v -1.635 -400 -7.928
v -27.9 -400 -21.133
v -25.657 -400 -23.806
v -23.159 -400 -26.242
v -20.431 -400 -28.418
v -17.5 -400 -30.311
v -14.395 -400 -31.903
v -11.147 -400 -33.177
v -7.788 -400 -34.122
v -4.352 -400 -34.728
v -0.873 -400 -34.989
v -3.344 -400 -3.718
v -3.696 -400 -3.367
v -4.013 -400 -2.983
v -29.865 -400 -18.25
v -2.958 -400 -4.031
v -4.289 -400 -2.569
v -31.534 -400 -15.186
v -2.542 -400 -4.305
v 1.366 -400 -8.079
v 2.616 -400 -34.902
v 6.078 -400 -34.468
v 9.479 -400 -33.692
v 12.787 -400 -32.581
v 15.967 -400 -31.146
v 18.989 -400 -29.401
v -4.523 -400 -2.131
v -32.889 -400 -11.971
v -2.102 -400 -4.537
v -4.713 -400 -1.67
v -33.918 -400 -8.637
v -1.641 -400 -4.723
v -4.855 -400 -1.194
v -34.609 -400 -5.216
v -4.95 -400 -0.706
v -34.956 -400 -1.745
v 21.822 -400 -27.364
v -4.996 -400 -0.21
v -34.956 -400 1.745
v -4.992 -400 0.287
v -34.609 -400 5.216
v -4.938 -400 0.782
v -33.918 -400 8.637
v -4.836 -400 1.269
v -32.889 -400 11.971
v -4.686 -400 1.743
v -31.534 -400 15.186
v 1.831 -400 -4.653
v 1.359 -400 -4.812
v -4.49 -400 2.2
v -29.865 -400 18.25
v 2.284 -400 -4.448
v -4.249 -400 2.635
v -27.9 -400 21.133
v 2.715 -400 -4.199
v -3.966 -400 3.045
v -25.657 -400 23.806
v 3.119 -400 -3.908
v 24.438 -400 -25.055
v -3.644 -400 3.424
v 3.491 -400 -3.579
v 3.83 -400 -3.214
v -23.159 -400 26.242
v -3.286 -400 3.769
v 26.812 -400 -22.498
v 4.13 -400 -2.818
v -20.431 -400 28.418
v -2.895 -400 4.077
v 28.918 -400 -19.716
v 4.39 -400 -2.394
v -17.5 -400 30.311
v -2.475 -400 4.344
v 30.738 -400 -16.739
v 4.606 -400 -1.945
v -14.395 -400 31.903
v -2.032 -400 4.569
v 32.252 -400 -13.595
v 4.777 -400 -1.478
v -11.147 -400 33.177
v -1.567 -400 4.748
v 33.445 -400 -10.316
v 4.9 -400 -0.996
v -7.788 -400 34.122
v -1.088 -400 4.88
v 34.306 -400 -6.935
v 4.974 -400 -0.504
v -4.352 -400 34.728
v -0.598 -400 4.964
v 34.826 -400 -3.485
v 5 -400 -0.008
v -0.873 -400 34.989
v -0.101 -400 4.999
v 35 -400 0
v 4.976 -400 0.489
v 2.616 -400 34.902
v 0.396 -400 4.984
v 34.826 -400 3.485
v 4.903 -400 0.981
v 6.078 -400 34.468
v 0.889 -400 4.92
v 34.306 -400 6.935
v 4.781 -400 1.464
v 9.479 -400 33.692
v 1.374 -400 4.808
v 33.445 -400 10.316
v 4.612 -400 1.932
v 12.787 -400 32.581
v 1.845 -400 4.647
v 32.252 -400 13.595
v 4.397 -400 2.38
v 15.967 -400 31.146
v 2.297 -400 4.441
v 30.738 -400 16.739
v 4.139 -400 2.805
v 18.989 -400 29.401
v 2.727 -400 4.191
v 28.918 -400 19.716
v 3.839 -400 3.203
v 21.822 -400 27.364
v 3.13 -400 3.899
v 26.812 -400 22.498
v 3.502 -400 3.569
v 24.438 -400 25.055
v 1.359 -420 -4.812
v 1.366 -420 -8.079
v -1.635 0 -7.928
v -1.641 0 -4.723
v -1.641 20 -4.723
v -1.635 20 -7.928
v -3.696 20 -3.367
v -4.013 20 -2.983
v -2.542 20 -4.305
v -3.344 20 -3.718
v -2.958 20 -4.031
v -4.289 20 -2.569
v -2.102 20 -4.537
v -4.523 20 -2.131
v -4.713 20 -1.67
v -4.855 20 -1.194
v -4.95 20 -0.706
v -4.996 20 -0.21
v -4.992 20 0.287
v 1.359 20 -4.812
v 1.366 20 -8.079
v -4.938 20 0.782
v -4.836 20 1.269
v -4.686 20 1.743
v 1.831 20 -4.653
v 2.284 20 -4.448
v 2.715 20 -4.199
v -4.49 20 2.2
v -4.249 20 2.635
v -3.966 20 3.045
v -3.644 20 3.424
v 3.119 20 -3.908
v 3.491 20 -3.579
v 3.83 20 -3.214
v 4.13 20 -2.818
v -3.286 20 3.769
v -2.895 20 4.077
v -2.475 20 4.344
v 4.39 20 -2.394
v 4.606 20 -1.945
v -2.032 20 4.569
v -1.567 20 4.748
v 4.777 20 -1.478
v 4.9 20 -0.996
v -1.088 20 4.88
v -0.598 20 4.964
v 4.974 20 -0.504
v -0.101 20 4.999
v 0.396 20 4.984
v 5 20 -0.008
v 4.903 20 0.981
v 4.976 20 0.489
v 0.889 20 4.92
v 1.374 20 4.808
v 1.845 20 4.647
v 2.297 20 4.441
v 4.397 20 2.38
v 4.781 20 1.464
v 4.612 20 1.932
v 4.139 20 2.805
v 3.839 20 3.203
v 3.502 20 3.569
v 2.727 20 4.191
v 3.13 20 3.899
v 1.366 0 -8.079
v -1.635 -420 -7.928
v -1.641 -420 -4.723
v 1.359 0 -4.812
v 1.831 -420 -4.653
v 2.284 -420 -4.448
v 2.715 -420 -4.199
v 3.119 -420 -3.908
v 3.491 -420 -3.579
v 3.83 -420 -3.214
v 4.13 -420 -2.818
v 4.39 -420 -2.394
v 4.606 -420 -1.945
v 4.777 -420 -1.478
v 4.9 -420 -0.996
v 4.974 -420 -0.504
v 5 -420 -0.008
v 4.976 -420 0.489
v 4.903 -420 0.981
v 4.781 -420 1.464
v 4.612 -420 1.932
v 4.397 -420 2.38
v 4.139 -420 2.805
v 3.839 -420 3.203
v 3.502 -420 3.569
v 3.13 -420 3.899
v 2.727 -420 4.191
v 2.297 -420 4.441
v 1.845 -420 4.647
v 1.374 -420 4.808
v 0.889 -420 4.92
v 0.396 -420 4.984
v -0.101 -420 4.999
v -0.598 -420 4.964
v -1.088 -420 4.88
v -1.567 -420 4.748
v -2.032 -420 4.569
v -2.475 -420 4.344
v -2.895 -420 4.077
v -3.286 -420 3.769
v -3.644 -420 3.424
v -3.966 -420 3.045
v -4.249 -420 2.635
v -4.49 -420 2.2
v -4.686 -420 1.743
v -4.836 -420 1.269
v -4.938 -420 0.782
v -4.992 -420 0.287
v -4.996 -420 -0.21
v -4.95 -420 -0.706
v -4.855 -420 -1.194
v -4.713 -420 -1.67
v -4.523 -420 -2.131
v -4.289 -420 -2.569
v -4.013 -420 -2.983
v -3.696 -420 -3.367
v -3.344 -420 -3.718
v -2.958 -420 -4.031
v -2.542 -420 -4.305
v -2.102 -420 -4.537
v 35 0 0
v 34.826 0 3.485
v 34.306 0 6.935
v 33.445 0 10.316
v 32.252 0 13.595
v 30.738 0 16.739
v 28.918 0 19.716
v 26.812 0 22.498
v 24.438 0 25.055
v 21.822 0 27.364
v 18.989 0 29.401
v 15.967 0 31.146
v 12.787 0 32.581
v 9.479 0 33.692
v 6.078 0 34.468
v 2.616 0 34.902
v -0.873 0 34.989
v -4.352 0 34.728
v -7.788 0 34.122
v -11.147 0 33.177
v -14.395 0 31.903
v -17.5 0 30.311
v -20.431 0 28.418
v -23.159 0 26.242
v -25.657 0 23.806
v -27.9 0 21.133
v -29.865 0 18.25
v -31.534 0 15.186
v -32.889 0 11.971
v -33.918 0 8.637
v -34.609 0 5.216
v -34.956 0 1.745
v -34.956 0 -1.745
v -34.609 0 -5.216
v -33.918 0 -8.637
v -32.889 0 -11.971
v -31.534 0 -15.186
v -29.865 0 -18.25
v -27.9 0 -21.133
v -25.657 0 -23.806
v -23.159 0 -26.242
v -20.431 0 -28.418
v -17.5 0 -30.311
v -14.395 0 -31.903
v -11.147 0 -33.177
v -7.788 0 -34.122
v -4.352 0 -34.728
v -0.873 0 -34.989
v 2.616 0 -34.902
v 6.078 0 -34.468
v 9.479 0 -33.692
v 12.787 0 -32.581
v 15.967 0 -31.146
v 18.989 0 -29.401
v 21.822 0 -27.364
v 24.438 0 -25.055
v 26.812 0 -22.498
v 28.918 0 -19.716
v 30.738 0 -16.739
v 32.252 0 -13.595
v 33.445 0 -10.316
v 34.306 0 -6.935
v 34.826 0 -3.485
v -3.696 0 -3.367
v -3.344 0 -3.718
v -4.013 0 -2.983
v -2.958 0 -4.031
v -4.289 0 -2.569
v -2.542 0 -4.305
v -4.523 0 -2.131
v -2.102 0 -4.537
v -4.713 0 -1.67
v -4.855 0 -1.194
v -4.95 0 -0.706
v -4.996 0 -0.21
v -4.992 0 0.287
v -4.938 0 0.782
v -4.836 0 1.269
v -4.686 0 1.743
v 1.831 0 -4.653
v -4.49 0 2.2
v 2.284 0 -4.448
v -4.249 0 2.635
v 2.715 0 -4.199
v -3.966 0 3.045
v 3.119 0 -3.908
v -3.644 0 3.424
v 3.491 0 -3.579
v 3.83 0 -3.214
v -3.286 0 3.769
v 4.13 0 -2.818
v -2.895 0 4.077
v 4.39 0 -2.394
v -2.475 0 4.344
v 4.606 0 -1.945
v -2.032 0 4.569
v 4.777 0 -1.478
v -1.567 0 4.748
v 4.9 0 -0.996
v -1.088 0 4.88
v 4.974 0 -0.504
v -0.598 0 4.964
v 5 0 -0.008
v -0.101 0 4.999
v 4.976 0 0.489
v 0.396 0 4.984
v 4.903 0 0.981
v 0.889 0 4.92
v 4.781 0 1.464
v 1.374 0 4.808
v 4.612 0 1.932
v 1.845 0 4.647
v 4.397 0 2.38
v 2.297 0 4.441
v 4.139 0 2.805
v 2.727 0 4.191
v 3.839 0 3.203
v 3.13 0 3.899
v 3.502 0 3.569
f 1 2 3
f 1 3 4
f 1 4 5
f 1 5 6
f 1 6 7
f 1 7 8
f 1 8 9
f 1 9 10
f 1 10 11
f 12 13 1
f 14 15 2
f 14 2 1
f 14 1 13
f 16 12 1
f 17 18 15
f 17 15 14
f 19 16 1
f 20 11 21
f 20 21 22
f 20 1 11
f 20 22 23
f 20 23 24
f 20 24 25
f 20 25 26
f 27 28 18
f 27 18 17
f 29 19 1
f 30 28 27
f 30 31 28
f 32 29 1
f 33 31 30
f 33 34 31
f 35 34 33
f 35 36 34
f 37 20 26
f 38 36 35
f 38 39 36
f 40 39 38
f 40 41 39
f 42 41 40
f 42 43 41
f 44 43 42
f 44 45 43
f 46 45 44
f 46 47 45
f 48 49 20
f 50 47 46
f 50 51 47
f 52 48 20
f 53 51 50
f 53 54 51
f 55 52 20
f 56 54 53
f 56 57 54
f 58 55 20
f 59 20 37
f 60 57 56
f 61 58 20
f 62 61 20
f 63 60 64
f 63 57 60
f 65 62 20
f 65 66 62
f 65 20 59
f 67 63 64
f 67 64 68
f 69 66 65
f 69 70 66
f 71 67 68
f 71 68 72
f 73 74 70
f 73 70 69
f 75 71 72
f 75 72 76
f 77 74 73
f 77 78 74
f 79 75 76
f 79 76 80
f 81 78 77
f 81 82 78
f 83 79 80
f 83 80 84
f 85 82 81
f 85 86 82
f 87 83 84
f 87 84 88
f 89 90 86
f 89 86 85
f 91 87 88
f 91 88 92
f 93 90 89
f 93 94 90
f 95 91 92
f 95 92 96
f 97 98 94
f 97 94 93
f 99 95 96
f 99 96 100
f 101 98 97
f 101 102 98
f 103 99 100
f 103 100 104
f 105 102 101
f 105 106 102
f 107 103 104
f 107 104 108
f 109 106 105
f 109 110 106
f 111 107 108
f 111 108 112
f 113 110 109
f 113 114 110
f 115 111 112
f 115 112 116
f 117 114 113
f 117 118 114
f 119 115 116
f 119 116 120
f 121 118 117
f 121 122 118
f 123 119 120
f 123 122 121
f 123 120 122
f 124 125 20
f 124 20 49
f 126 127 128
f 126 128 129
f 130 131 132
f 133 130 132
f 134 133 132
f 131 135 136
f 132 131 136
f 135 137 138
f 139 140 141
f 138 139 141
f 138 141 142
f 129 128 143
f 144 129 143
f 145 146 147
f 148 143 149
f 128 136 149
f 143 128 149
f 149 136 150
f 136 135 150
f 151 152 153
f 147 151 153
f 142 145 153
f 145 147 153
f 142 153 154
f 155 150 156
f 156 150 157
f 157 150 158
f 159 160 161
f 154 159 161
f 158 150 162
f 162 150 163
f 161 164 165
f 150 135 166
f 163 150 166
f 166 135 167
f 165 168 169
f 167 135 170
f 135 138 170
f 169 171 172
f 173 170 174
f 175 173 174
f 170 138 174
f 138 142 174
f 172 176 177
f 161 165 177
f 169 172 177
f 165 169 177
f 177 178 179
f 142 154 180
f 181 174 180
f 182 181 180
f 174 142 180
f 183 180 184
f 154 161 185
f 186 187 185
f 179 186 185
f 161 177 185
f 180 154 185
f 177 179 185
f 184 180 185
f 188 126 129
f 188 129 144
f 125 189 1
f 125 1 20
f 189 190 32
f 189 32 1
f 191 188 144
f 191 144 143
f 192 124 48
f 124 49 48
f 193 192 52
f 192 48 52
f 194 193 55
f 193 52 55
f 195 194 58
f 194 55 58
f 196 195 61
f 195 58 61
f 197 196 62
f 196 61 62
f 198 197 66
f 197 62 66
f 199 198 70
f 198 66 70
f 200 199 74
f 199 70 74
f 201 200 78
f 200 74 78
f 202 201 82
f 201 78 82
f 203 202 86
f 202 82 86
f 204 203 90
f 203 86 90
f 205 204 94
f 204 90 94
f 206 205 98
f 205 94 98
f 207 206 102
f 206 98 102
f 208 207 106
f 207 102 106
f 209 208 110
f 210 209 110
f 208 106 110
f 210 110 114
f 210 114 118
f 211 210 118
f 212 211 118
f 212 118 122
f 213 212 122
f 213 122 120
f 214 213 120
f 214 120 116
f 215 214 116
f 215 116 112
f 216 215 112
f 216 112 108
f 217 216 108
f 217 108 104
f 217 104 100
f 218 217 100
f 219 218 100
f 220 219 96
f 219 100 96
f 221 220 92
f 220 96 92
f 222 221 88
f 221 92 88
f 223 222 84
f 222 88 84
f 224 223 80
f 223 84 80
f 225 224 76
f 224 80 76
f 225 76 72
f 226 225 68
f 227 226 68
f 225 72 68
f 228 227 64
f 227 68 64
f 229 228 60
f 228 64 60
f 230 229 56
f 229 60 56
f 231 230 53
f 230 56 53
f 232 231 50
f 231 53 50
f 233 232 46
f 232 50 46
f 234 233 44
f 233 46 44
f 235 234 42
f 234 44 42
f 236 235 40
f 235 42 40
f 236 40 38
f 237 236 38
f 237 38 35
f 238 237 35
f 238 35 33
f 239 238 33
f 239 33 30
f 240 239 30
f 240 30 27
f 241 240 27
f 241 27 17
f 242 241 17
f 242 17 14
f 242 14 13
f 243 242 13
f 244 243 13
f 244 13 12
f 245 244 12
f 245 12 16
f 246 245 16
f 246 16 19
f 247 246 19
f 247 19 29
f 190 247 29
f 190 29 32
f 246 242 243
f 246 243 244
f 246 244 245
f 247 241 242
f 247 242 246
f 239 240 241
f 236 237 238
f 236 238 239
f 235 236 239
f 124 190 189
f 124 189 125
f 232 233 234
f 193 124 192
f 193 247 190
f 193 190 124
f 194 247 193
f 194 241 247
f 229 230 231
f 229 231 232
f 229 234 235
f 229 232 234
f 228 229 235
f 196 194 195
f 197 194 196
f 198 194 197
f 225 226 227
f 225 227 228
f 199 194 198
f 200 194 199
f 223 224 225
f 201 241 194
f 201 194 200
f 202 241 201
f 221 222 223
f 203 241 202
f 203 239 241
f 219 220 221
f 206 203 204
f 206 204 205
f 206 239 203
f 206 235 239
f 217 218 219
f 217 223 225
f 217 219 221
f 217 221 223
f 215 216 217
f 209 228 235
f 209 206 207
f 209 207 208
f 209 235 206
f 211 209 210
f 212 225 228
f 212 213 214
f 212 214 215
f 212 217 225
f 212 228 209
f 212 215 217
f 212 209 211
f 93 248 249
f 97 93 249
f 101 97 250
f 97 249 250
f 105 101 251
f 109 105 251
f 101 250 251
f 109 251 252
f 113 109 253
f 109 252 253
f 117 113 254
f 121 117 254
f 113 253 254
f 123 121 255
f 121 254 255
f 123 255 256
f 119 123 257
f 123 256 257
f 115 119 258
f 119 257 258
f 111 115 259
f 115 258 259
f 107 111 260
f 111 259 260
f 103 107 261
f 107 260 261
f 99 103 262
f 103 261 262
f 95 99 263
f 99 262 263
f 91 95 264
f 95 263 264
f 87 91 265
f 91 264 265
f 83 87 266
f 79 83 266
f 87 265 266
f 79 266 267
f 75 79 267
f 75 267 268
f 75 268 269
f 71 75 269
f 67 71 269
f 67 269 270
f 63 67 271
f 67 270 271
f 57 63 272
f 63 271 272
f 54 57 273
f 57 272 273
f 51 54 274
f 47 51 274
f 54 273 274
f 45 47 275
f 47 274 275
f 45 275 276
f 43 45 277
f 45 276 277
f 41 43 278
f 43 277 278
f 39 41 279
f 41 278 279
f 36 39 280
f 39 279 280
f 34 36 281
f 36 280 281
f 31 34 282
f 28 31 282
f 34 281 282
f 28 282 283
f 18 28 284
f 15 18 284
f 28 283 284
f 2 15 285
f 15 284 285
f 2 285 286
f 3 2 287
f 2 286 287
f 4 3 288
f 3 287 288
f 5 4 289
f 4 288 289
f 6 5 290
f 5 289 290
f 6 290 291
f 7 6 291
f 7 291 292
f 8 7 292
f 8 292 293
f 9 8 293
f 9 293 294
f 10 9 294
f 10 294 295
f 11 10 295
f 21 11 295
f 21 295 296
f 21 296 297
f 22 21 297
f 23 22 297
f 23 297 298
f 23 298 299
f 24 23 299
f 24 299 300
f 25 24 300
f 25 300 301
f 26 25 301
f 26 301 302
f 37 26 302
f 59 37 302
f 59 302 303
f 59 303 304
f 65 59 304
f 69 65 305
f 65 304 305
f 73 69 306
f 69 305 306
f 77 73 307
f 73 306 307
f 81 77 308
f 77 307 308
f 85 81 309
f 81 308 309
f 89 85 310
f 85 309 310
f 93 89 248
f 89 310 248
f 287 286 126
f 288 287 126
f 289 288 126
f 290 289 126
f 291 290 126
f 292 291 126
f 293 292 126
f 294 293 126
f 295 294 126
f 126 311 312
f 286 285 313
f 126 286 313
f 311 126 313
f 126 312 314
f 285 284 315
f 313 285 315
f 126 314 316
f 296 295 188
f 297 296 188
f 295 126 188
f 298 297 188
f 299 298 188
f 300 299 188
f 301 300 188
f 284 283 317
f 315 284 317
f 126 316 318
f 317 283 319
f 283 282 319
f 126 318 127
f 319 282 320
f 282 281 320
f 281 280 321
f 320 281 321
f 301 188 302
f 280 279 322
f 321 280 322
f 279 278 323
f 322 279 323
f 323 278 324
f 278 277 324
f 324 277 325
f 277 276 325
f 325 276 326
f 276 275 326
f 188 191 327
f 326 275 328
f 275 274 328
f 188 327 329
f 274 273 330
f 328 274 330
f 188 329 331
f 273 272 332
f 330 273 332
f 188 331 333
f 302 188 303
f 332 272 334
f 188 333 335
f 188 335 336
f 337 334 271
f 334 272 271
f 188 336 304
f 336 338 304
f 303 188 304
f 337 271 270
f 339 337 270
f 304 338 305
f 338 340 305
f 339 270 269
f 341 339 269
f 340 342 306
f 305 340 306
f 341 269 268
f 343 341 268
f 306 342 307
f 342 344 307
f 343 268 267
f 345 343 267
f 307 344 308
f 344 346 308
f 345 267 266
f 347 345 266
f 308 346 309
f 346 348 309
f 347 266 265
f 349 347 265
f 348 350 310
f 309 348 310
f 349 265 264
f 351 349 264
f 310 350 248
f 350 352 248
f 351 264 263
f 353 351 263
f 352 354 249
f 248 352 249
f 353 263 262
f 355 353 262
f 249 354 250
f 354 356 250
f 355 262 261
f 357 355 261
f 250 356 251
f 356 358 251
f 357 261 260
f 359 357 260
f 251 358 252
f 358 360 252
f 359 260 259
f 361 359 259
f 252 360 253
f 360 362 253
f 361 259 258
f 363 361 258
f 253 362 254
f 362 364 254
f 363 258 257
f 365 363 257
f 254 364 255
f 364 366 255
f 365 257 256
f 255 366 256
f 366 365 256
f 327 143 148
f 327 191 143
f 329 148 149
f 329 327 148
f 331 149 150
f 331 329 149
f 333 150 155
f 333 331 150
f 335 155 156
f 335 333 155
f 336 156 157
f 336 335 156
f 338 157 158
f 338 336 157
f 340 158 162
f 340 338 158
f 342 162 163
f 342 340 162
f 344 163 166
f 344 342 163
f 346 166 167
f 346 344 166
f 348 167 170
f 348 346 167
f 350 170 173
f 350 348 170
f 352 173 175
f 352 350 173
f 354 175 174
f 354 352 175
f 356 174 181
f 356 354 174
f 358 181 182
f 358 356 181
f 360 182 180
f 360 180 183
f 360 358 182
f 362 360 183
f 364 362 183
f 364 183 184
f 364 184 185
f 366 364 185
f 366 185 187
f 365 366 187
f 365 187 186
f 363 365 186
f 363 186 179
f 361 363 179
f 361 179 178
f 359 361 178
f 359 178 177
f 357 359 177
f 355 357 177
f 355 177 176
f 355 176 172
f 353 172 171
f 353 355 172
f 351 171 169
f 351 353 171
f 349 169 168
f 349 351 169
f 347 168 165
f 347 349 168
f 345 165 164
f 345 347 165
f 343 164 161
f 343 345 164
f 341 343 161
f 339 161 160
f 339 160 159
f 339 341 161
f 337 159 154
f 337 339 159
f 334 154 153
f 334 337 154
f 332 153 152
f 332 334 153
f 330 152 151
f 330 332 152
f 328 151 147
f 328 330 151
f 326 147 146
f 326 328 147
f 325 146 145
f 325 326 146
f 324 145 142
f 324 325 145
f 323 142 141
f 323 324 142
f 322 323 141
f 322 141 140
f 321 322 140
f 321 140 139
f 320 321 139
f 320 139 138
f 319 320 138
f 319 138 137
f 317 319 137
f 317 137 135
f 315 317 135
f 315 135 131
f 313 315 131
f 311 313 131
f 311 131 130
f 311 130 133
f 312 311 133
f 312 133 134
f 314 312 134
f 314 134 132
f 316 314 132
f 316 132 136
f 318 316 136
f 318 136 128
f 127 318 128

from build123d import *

# Parameters (mm, degrees)
F0_R     = 35
F1_DEPTH = 400
F2_R     = 5
F3_DEPTH = 20
F4_DEPTH = 420
F6_DEPTH = 20
F7_DEPTH = 420


with BuildPart() as f1:
    # F0 (on Front) → F1 (new body)
    with BuildSketch(Plane.XZ):
        Circle(F0_R)
    extrude(amount=F1_DEPTH)

    # F2 (on Front) → F3 (join)
    with BuildSketch(Plane.XZ):
        Circle(F2_R)
    extrude(amount=-F3_DEPTH)

    # F2 (on Front) → F4 (join)
    with BuildSketch(Plane.XZ):
        Circle(F2_R)
    extrude(amount=F4_DEPTH)

    # F5 (on face) → F6 (join, symmetric)
    with BuildSketch(Plane.XZ.offset(400)):
        with BuildLine():
            ThreePointArc((1.3593261446, -4.8116766758), (-0.1474726193, -4.9978247095), (-1.6406738554, -4.723154592))
            Line((-1.6406738554, -4.723154592), (-1.6345586628, -7.9277958721))
            Line((-1.6345586628, -7.9277958721), (1.3655608437, -8.0789448297))
            Line((1.3655608437, -8.0789448297), (1.3593261446, -4.8116766758))
        make_face()
    extrude(amount=F6_DEPTH, both=True)

    # F5 (on face) → F7 (join)
    with BuildSketch(Plane.XZ.offset(400)):
        with BuildLine():
            ThreePointArc((1.3593261446, -4.8116766758), (-0.1474726193, -4.9978247095), (-1.6406738554, -4.723154592))
            Line((-1.6406738554, -4.723154592), (-1.6345586628, -7.9277958721))
            Line((-1.6345586628, -7.9277958721), (1.3655608437, -8.0789448297))
            Line((1.3655608437, -8.0789448297), (1.3593261446, -4.8116766758))
        make_face()
    extrude(amount=-F7_DEPTH)


solid = f1.part
